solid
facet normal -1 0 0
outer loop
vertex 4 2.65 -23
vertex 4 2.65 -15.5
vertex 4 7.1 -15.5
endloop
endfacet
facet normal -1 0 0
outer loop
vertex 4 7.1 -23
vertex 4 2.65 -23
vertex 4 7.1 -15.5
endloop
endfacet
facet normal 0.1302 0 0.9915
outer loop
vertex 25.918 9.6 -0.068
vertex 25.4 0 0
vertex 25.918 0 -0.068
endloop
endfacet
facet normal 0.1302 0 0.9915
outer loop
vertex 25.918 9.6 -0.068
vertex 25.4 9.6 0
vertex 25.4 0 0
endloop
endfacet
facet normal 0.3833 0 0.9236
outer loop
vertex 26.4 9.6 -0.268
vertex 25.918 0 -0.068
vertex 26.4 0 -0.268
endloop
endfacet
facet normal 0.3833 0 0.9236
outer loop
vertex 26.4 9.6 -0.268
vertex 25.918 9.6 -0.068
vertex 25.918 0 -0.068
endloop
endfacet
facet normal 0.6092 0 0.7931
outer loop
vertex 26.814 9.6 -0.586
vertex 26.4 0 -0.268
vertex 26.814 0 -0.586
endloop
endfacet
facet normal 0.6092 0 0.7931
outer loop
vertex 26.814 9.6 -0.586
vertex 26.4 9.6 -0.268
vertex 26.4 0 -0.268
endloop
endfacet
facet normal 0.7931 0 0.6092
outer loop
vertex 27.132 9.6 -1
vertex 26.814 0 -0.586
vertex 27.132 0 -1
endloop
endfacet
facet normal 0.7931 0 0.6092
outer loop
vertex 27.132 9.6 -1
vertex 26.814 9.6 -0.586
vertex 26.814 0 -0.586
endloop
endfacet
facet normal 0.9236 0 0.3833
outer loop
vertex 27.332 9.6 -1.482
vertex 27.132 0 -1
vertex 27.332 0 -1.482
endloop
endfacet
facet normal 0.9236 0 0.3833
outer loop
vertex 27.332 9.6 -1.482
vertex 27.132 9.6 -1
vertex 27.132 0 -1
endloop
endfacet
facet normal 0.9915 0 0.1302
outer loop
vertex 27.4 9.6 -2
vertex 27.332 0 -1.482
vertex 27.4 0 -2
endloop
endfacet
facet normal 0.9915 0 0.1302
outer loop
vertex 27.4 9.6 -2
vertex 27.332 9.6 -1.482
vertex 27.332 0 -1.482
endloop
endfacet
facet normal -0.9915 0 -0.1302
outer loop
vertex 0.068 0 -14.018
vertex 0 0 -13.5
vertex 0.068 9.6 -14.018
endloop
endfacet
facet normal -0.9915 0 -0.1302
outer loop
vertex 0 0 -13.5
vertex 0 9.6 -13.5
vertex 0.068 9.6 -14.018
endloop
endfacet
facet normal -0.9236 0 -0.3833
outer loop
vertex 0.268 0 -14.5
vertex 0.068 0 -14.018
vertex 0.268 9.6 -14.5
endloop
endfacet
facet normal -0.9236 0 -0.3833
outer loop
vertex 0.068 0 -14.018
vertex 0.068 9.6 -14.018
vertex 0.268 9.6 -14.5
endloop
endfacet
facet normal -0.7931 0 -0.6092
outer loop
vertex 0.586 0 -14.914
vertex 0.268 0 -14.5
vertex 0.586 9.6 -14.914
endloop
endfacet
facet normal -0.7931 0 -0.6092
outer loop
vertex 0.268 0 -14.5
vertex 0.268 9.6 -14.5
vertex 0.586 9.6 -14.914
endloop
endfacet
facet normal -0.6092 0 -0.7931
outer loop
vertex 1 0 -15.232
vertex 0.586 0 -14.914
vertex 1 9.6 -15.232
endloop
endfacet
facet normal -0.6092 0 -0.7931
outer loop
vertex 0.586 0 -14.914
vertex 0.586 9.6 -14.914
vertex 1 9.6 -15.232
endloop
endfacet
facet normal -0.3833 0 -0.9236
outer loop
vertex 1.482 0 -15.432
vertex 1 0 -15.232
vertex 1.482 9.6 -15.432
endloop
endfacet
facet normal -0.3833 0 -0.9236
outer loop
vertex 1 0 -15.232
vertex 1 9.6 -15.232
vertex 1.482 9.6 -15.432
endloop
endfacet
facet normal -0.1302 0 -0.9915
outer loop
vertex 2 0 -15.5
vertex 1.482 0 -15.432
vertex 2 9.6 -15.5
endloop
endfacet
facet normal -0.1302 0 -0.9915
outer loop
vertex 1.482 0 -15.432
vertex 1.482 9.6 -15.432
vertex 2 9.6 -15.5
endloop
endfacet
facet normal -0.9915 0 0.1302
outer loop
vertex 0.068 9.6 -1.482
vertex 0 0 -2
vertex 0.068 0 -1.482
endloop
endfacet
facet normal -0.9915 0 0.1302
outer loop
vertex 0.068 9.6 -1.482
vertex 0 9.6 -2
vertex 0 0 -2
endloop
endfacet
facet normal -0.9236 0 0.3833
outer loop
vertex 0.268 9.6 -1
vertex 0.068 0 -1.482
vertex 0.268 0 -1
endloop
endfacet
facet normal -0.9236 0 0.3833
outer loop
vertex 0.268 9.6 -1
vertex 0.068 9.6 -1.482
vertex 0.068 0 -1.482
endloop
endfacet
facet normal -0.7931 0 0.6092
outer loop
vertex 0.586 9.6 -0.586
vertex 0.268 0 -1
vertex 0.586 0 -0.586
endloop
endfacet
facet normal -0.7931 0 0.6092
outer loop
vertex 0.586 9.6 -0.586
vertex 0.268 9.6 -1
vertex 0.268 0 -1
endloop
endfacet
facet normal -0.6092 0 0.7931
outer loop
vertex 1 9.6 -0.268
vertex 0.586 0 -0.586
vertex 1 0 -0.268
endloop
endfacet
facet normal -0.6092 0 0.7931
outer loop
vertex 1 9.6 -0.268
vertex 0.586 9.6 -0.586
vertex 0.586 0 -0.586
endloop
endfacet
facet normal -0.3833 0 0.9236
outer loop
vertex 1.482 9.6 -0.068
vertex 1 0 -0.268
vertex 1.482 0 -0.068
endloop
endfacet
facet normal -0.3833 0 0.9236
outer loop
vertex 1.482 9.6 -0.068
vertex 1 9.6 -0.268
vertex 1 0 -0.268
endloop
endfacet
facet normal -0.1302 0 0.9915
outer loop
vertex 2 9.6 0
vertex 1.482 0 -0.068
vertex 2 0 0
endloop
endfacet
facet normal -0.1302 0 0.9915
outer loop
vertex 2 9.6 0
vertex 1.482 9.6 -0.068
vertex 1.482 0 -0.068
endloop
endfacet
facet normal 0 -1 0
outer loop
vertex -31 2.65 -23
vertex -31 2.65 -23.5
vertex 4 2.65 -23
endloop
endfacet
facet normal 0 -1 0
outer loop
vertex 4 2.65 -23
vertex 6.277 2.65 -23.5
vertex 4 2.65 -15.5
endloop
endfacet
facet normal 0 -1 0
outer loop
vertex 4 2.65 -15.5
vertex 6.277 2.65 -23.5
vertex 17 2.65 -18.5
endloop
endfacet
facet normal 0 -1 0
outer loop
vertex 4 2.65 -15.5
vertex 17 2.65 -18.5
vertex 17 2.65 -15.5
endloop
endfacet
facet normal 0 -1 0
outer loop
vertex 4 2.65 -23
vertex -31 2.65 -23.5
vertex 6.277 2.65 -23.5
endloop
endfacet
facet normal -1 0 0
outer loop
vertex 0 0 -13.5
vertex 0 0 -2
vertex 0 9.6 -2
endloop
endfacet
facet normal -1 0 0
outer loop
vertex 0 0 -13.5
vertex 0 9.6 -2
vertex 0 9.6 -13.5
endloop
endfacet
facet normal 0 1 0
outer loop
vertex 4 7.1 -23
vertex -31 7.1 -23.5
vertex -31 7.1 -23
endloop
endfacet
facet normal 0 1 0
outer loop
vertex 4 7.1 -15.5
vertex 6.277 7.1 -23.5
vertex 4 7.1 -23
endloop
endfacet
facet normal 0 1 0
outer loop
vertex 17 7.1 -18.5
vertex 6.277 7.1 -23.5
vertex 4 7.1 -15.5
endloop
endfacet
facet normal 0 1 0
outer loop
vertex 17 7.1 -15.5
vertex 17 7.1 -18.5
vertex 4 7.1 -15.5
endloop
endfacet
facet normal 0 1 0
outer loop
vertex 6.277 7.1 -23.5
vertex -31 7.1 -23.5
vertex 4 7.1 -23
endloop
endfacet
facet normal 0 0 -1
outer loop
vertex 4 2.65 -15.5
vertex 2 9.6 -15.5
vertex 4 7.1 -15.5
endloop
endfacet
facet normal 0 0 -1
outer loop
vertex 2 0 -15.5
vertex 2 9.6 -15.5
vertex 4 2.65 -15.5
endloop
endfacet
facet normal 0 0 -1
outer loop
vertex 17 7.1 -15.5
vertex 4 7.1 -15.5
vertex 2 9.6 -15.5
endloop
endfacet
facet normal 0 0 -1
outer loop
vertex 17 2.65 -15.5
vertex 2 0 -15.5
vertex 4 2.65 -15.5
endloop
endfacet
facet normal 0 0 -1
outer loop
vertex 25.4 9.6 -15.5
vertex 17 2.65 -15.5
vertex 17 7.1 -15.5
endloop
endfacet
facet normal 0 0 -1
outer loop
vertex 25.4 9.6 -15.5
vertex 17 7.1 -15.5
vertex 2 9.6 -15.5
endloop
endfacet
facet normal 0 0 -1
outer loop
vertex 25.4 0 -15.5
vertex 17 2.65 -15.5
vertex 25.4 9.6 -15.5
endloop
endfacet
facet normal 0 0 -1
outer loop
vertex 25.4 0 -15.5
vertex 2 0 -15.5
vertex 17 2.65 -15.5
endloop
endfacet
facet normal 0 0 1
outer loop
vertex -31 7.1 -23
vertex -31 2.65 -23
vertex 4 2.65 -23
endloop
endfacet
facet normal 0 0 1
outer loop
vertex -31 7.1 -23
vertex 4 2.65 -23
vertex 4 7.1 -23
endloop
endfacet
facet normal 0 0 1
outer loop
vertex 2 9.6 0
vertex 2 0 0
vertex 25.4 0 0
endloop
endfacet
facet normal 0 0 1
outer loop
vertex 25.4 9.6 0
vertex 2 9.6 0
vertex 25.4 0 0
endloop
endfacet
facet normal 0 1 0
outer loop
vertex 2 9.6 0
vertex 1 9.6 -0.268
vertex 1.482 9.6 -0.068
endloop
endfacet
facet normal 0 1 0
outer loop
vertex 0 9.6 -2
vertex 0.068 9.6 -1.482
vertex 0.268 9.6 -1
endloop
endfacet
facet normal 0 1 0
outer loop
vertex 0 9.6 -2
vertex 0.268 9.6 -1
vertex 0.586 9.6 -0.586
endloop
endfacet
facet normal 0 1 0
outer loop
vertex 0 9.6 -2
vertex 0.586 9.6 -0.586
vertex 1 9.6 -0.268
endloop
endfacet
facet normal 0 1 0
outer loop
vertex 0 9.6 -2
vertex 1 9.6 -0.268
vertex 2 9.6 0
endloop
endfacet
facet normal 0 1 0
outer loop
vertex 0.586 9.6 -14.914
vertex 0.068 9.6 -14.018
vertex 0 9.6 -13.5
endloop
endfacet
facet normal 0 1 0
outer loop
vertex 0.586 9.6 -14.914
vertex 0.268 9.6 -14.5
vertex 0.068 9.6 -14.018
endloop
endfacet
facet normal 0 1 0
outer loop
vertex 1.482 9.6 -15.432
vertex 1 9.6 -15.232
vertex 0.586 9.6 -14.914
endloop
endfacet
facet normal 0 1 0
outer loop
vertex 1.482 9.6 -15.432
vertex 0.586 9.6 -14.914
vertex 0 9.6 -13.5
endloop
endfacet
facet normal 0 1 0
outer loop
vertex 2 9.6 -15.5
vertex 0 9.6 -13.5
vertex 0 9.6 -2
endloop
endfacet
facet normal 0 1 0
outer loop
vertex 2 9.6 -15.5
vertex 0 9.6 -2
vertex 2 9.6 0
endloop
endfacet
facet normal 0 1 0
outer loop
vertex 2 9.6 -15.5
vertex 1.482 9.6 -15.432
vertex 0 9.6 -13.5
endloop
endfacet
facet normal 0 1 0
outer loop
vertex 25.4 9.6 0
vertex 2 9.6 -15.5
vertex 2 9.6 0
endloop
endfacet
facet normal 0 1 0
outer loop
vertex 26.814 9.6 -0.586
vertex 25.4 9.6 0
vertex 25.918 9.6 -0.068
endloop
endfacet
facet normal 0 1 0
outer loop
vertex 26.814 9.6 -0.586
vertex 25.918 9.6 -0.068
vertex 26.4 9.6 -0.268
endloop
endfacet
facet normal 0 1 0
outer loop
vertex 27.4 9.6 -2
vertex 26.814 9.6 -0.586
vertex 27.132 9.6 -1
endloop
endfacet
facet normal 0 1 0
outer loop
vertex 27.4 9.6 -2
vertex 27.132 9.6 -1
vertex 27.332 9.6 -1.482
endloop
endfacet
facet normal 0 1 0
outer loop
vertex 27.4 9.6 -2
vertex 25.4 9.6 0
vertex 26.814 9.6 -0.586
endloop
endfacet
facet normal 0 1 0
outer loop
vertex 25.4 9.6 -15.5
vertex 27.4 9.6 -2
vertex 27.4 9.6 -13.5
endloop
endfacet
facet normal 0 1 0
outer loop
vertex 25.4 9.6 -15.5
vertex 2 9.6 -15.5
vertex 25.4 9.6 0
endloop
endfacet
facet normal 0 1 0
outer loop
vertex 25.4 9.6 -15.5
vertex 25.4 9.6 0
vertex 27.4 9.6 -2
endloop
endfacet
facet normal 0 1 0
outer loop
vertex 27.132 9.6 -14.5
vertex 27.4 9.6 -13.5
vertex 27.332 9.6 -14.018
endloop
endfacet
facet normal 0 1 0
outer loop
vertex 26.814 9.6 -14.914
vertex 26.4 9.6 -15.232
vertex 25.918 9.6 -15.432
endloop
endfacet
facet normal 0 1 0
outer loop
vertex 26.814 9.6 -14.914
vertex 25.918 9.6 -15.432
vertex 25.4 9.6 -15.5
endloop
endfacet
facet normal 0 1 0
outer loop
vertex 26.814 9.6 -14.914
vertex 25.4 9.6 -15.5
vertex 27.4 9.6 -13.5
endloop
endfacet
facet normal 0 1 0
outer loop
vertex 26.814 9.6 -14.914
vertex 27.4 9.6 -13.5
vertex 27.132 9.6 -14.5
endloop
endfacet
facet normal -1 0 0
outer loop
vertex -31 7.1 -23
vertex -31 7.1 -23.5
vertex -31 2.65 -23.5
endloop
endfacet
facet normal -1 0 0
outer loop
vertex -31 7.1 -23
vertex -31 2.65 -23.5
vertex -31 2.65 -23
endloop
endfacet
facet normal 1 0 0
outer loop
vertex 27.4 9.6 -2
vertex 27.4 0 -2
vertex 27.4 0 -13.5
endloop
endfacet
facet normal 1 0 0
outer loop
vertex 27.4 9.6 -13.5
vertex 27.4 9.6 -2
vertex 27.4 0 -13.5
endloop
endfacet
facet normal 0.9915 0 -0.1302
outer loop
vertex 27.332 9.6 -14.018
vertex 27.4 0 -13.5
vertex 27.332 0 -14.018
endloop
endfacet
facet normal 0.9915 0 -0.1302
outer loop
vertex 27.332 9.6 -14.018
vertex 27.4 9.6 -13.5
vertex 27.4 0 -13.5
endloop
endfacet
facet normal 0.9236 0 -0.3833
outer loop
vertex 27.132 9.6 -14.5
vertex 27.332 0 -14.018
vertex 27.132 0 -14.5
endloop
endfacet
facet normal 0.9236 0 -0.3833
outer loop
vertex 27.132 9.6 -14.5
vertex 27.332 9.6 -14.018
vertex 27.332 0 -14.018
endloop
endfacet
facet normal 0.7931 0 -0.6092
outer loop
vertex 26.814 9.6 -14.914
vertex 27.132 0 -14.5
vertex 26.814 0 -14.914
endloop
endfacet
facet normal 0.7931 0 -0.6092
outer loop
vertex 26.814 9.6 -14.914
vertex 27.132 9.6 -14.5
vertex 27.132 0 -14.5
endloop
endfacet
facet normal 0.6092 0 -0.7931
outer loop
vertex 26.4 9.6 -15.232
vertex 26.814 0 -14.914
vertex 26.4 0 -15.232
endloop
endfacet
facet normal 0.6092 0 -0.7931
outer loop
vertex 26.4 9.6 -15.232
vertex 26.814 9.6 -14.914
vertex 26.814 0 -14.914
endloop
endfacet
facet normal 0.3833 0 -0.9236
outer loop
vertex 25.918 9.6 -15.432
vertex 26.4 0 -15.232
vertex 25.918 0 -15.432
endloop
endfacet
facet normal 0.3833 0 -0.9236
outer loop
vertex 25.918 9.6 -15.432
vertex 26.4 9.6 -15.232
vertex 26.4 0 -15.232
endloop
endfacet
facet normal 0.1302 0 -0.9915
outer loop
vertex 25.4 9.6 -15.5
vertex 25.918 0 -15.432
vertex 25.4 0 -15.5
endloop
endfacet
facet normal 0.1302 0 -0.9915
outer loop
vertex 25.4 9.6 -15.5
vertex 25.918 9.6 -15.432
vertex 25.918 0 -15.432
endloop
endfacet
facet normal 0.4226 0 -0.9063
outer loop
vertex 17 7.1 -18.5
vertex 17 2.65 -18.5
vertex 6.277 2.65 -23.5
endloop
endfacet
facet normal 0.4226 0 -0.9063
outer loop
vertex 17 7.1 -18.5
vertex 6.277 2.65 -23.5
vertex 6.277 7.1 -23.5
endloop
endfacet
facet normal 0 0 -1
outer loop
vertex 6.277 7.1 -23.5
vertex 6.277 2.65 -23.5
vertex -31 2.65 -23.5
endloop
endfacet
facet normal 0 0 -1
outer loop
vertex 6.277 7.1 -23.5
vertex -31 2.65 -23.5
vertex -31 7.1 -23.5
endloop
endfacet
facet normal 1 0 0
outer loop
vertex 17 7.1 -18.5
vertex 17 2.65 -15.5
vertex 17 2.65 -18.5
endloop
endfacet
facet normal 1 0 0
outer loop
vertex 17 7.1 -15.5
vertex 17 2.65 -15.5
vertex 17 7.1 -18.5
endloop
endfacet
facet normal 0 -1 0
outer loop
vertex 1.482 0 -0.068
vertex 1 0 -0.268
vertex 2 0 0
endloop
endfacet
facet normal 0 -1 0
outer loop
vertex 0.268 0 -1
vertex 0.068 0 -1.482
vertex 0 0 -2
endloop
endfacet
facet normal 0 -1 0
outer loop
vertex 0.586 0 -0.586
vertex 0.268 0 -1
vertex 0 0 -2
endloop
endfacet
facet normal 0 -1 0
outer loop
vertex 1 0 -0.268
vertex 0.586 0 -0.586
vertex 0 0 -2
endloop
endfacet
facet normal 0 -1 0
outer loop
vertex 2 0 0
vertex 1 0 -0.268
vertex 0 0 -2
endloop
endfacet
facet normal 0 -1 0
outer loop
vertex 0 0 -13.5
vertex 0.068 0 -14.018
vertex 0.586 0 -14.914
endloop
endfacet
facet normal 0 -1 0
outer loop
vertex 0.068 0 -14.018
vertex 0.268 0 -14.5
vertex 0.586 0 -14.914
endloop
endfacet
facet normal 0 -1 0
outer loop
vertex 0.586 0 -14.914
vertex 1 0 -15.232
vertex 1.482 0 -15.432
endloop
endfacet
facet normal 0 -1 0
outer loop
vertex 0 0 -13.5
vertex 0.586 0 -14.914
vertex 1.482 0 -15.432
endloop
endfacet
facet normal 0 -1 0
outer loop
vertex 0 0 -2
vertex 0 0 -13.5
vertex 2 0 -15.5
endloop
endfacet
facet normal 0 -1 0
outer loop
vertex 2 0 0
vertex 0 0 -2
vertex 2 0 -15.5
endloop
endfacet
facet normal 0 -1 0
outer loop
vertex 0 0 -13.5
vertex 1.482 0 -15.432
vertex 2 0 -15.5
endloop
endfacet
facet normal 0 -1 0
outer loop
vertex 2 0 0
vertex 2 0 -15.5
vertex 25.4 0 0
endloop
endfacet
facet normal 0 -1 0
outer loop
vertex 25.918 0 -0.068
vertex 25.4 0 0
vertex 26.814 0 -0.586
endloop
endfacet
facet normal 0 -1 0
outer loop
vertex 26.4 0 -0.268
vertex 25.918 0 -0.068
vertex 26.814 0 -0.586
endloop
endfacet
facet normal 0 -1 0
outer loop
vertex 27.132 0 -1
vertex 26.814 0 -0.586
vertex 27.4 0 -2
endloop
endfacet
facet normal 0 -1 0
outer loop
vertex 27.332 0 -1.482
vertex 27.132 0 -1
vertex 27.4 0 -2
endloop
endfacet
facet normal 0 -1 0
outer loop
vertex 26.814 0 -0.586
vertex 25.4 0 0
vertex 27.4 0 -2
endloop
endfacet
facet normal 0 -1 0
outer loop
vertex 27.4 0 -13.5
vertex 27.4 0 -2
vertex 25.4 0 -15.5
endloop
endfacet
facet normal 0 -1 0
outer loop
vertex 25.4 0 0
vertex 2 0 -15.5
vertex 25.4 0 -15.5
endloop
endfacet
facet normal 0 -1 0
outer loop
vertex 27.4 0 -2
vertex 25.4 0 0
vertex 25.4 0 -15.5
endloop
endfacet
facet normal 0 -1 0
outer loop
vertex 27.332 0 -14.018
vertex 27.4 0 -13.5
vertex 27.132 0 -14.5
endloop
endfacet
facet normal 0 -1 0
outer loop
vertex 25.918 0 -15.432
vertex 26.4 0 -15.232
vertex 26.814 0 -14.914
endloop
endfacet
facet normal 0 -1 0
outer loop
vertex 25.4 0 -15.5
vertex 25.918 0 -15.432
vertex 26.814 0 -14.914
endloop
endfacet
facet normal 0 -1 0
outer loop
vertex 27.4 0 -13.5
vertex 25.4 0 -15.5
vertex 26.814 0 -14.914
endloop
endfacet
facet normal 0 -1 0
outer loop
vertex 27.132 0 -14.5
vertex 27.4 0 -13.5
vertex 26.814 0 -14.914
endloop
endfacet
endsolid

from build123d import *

# Parameters (mm, degrees)
SKETCH1_W           = 27.4
SKETCH1_H           = 15.5
BOSS_EXTRUDE1_DEPTH = 9.6
FILLET1_R           = 2
SKETCH2_W           = 13
SKETCH2_H           = 4.45
BOSS_EXTRUDE2_DEPTH = 8
SKETCH3_W           = 0.5
SKETCH3_H           = 4.45
BOSS_EXTRUDE3_DEPTH = 35
CHAMFER1_SIZE       = 5
CHAMFER1_SIZE2      = 10.722534603


with BuildPart() as part:
    # Sketch1 → Boss-Extrude1 (new body)
    with BuildSketch(Plane(origin=(0, 0, 0), x_dir=(1, 0, 0), z_dir=(0, 1, 0))):
        with Locations((13.7, 7.75)):
            Rectangle(SKETCH1_W, SKETCH1_H)
    extrude(amount=BOSS_EXTRUDE1_DEPTH)

    # Fillet1
    fillet1_edges = [part.edges().sort_by_distance(p)[0] for p in [
        (0, 4.8, -15.5),
        (27.4, 4.8, -15.5),
        (27.4, 4.8, 0),
        (0, 4.8, 0),
    ]]
    fillet(fillet1_edges, radius=FILLET1_R)

    # Sketch2 → Boss-Extrude2 (add)
    with BuildSketch(Plane(origin=(0, 0, -15.5), x_dir=(-1, 0, 0), z_dir=(0, 0, -1))):
        with Locations((-10.5, 4.875)):
            Rectangle(SKETCH2_W, SKETCH2_H)
    extrude(amount=BOSS_EXTRUDE2_DEPTH)

    # Sketch3 → Boss-Extrude3 (add)
    with BuildSketch(Plane.ZY.offset(-4)):
        with Locations((-23.25, 4.875)):
            Rectangle(SKETCH3_W, SKETCH3_H)
    extrude(amount=BOSS_EXTRUDE3_DEPTH)

    # Chamfer1
    chamfer1_edges = [part.edges().sort_by_distance(p)[0] for p in [
        (17, 4.875, -23.5),
    ]]
    chamfer1_side = [part.faces().sort_by_distance(p)[0] for p in [
        (17, 4.875, -19.5),
    ]]
    chamfer(chamfer1_edges, length=CHAMFER1_SIZE, length2=CHAMFER1_SIZE2, reference=chamfer1_side[0])


solid = part.part
